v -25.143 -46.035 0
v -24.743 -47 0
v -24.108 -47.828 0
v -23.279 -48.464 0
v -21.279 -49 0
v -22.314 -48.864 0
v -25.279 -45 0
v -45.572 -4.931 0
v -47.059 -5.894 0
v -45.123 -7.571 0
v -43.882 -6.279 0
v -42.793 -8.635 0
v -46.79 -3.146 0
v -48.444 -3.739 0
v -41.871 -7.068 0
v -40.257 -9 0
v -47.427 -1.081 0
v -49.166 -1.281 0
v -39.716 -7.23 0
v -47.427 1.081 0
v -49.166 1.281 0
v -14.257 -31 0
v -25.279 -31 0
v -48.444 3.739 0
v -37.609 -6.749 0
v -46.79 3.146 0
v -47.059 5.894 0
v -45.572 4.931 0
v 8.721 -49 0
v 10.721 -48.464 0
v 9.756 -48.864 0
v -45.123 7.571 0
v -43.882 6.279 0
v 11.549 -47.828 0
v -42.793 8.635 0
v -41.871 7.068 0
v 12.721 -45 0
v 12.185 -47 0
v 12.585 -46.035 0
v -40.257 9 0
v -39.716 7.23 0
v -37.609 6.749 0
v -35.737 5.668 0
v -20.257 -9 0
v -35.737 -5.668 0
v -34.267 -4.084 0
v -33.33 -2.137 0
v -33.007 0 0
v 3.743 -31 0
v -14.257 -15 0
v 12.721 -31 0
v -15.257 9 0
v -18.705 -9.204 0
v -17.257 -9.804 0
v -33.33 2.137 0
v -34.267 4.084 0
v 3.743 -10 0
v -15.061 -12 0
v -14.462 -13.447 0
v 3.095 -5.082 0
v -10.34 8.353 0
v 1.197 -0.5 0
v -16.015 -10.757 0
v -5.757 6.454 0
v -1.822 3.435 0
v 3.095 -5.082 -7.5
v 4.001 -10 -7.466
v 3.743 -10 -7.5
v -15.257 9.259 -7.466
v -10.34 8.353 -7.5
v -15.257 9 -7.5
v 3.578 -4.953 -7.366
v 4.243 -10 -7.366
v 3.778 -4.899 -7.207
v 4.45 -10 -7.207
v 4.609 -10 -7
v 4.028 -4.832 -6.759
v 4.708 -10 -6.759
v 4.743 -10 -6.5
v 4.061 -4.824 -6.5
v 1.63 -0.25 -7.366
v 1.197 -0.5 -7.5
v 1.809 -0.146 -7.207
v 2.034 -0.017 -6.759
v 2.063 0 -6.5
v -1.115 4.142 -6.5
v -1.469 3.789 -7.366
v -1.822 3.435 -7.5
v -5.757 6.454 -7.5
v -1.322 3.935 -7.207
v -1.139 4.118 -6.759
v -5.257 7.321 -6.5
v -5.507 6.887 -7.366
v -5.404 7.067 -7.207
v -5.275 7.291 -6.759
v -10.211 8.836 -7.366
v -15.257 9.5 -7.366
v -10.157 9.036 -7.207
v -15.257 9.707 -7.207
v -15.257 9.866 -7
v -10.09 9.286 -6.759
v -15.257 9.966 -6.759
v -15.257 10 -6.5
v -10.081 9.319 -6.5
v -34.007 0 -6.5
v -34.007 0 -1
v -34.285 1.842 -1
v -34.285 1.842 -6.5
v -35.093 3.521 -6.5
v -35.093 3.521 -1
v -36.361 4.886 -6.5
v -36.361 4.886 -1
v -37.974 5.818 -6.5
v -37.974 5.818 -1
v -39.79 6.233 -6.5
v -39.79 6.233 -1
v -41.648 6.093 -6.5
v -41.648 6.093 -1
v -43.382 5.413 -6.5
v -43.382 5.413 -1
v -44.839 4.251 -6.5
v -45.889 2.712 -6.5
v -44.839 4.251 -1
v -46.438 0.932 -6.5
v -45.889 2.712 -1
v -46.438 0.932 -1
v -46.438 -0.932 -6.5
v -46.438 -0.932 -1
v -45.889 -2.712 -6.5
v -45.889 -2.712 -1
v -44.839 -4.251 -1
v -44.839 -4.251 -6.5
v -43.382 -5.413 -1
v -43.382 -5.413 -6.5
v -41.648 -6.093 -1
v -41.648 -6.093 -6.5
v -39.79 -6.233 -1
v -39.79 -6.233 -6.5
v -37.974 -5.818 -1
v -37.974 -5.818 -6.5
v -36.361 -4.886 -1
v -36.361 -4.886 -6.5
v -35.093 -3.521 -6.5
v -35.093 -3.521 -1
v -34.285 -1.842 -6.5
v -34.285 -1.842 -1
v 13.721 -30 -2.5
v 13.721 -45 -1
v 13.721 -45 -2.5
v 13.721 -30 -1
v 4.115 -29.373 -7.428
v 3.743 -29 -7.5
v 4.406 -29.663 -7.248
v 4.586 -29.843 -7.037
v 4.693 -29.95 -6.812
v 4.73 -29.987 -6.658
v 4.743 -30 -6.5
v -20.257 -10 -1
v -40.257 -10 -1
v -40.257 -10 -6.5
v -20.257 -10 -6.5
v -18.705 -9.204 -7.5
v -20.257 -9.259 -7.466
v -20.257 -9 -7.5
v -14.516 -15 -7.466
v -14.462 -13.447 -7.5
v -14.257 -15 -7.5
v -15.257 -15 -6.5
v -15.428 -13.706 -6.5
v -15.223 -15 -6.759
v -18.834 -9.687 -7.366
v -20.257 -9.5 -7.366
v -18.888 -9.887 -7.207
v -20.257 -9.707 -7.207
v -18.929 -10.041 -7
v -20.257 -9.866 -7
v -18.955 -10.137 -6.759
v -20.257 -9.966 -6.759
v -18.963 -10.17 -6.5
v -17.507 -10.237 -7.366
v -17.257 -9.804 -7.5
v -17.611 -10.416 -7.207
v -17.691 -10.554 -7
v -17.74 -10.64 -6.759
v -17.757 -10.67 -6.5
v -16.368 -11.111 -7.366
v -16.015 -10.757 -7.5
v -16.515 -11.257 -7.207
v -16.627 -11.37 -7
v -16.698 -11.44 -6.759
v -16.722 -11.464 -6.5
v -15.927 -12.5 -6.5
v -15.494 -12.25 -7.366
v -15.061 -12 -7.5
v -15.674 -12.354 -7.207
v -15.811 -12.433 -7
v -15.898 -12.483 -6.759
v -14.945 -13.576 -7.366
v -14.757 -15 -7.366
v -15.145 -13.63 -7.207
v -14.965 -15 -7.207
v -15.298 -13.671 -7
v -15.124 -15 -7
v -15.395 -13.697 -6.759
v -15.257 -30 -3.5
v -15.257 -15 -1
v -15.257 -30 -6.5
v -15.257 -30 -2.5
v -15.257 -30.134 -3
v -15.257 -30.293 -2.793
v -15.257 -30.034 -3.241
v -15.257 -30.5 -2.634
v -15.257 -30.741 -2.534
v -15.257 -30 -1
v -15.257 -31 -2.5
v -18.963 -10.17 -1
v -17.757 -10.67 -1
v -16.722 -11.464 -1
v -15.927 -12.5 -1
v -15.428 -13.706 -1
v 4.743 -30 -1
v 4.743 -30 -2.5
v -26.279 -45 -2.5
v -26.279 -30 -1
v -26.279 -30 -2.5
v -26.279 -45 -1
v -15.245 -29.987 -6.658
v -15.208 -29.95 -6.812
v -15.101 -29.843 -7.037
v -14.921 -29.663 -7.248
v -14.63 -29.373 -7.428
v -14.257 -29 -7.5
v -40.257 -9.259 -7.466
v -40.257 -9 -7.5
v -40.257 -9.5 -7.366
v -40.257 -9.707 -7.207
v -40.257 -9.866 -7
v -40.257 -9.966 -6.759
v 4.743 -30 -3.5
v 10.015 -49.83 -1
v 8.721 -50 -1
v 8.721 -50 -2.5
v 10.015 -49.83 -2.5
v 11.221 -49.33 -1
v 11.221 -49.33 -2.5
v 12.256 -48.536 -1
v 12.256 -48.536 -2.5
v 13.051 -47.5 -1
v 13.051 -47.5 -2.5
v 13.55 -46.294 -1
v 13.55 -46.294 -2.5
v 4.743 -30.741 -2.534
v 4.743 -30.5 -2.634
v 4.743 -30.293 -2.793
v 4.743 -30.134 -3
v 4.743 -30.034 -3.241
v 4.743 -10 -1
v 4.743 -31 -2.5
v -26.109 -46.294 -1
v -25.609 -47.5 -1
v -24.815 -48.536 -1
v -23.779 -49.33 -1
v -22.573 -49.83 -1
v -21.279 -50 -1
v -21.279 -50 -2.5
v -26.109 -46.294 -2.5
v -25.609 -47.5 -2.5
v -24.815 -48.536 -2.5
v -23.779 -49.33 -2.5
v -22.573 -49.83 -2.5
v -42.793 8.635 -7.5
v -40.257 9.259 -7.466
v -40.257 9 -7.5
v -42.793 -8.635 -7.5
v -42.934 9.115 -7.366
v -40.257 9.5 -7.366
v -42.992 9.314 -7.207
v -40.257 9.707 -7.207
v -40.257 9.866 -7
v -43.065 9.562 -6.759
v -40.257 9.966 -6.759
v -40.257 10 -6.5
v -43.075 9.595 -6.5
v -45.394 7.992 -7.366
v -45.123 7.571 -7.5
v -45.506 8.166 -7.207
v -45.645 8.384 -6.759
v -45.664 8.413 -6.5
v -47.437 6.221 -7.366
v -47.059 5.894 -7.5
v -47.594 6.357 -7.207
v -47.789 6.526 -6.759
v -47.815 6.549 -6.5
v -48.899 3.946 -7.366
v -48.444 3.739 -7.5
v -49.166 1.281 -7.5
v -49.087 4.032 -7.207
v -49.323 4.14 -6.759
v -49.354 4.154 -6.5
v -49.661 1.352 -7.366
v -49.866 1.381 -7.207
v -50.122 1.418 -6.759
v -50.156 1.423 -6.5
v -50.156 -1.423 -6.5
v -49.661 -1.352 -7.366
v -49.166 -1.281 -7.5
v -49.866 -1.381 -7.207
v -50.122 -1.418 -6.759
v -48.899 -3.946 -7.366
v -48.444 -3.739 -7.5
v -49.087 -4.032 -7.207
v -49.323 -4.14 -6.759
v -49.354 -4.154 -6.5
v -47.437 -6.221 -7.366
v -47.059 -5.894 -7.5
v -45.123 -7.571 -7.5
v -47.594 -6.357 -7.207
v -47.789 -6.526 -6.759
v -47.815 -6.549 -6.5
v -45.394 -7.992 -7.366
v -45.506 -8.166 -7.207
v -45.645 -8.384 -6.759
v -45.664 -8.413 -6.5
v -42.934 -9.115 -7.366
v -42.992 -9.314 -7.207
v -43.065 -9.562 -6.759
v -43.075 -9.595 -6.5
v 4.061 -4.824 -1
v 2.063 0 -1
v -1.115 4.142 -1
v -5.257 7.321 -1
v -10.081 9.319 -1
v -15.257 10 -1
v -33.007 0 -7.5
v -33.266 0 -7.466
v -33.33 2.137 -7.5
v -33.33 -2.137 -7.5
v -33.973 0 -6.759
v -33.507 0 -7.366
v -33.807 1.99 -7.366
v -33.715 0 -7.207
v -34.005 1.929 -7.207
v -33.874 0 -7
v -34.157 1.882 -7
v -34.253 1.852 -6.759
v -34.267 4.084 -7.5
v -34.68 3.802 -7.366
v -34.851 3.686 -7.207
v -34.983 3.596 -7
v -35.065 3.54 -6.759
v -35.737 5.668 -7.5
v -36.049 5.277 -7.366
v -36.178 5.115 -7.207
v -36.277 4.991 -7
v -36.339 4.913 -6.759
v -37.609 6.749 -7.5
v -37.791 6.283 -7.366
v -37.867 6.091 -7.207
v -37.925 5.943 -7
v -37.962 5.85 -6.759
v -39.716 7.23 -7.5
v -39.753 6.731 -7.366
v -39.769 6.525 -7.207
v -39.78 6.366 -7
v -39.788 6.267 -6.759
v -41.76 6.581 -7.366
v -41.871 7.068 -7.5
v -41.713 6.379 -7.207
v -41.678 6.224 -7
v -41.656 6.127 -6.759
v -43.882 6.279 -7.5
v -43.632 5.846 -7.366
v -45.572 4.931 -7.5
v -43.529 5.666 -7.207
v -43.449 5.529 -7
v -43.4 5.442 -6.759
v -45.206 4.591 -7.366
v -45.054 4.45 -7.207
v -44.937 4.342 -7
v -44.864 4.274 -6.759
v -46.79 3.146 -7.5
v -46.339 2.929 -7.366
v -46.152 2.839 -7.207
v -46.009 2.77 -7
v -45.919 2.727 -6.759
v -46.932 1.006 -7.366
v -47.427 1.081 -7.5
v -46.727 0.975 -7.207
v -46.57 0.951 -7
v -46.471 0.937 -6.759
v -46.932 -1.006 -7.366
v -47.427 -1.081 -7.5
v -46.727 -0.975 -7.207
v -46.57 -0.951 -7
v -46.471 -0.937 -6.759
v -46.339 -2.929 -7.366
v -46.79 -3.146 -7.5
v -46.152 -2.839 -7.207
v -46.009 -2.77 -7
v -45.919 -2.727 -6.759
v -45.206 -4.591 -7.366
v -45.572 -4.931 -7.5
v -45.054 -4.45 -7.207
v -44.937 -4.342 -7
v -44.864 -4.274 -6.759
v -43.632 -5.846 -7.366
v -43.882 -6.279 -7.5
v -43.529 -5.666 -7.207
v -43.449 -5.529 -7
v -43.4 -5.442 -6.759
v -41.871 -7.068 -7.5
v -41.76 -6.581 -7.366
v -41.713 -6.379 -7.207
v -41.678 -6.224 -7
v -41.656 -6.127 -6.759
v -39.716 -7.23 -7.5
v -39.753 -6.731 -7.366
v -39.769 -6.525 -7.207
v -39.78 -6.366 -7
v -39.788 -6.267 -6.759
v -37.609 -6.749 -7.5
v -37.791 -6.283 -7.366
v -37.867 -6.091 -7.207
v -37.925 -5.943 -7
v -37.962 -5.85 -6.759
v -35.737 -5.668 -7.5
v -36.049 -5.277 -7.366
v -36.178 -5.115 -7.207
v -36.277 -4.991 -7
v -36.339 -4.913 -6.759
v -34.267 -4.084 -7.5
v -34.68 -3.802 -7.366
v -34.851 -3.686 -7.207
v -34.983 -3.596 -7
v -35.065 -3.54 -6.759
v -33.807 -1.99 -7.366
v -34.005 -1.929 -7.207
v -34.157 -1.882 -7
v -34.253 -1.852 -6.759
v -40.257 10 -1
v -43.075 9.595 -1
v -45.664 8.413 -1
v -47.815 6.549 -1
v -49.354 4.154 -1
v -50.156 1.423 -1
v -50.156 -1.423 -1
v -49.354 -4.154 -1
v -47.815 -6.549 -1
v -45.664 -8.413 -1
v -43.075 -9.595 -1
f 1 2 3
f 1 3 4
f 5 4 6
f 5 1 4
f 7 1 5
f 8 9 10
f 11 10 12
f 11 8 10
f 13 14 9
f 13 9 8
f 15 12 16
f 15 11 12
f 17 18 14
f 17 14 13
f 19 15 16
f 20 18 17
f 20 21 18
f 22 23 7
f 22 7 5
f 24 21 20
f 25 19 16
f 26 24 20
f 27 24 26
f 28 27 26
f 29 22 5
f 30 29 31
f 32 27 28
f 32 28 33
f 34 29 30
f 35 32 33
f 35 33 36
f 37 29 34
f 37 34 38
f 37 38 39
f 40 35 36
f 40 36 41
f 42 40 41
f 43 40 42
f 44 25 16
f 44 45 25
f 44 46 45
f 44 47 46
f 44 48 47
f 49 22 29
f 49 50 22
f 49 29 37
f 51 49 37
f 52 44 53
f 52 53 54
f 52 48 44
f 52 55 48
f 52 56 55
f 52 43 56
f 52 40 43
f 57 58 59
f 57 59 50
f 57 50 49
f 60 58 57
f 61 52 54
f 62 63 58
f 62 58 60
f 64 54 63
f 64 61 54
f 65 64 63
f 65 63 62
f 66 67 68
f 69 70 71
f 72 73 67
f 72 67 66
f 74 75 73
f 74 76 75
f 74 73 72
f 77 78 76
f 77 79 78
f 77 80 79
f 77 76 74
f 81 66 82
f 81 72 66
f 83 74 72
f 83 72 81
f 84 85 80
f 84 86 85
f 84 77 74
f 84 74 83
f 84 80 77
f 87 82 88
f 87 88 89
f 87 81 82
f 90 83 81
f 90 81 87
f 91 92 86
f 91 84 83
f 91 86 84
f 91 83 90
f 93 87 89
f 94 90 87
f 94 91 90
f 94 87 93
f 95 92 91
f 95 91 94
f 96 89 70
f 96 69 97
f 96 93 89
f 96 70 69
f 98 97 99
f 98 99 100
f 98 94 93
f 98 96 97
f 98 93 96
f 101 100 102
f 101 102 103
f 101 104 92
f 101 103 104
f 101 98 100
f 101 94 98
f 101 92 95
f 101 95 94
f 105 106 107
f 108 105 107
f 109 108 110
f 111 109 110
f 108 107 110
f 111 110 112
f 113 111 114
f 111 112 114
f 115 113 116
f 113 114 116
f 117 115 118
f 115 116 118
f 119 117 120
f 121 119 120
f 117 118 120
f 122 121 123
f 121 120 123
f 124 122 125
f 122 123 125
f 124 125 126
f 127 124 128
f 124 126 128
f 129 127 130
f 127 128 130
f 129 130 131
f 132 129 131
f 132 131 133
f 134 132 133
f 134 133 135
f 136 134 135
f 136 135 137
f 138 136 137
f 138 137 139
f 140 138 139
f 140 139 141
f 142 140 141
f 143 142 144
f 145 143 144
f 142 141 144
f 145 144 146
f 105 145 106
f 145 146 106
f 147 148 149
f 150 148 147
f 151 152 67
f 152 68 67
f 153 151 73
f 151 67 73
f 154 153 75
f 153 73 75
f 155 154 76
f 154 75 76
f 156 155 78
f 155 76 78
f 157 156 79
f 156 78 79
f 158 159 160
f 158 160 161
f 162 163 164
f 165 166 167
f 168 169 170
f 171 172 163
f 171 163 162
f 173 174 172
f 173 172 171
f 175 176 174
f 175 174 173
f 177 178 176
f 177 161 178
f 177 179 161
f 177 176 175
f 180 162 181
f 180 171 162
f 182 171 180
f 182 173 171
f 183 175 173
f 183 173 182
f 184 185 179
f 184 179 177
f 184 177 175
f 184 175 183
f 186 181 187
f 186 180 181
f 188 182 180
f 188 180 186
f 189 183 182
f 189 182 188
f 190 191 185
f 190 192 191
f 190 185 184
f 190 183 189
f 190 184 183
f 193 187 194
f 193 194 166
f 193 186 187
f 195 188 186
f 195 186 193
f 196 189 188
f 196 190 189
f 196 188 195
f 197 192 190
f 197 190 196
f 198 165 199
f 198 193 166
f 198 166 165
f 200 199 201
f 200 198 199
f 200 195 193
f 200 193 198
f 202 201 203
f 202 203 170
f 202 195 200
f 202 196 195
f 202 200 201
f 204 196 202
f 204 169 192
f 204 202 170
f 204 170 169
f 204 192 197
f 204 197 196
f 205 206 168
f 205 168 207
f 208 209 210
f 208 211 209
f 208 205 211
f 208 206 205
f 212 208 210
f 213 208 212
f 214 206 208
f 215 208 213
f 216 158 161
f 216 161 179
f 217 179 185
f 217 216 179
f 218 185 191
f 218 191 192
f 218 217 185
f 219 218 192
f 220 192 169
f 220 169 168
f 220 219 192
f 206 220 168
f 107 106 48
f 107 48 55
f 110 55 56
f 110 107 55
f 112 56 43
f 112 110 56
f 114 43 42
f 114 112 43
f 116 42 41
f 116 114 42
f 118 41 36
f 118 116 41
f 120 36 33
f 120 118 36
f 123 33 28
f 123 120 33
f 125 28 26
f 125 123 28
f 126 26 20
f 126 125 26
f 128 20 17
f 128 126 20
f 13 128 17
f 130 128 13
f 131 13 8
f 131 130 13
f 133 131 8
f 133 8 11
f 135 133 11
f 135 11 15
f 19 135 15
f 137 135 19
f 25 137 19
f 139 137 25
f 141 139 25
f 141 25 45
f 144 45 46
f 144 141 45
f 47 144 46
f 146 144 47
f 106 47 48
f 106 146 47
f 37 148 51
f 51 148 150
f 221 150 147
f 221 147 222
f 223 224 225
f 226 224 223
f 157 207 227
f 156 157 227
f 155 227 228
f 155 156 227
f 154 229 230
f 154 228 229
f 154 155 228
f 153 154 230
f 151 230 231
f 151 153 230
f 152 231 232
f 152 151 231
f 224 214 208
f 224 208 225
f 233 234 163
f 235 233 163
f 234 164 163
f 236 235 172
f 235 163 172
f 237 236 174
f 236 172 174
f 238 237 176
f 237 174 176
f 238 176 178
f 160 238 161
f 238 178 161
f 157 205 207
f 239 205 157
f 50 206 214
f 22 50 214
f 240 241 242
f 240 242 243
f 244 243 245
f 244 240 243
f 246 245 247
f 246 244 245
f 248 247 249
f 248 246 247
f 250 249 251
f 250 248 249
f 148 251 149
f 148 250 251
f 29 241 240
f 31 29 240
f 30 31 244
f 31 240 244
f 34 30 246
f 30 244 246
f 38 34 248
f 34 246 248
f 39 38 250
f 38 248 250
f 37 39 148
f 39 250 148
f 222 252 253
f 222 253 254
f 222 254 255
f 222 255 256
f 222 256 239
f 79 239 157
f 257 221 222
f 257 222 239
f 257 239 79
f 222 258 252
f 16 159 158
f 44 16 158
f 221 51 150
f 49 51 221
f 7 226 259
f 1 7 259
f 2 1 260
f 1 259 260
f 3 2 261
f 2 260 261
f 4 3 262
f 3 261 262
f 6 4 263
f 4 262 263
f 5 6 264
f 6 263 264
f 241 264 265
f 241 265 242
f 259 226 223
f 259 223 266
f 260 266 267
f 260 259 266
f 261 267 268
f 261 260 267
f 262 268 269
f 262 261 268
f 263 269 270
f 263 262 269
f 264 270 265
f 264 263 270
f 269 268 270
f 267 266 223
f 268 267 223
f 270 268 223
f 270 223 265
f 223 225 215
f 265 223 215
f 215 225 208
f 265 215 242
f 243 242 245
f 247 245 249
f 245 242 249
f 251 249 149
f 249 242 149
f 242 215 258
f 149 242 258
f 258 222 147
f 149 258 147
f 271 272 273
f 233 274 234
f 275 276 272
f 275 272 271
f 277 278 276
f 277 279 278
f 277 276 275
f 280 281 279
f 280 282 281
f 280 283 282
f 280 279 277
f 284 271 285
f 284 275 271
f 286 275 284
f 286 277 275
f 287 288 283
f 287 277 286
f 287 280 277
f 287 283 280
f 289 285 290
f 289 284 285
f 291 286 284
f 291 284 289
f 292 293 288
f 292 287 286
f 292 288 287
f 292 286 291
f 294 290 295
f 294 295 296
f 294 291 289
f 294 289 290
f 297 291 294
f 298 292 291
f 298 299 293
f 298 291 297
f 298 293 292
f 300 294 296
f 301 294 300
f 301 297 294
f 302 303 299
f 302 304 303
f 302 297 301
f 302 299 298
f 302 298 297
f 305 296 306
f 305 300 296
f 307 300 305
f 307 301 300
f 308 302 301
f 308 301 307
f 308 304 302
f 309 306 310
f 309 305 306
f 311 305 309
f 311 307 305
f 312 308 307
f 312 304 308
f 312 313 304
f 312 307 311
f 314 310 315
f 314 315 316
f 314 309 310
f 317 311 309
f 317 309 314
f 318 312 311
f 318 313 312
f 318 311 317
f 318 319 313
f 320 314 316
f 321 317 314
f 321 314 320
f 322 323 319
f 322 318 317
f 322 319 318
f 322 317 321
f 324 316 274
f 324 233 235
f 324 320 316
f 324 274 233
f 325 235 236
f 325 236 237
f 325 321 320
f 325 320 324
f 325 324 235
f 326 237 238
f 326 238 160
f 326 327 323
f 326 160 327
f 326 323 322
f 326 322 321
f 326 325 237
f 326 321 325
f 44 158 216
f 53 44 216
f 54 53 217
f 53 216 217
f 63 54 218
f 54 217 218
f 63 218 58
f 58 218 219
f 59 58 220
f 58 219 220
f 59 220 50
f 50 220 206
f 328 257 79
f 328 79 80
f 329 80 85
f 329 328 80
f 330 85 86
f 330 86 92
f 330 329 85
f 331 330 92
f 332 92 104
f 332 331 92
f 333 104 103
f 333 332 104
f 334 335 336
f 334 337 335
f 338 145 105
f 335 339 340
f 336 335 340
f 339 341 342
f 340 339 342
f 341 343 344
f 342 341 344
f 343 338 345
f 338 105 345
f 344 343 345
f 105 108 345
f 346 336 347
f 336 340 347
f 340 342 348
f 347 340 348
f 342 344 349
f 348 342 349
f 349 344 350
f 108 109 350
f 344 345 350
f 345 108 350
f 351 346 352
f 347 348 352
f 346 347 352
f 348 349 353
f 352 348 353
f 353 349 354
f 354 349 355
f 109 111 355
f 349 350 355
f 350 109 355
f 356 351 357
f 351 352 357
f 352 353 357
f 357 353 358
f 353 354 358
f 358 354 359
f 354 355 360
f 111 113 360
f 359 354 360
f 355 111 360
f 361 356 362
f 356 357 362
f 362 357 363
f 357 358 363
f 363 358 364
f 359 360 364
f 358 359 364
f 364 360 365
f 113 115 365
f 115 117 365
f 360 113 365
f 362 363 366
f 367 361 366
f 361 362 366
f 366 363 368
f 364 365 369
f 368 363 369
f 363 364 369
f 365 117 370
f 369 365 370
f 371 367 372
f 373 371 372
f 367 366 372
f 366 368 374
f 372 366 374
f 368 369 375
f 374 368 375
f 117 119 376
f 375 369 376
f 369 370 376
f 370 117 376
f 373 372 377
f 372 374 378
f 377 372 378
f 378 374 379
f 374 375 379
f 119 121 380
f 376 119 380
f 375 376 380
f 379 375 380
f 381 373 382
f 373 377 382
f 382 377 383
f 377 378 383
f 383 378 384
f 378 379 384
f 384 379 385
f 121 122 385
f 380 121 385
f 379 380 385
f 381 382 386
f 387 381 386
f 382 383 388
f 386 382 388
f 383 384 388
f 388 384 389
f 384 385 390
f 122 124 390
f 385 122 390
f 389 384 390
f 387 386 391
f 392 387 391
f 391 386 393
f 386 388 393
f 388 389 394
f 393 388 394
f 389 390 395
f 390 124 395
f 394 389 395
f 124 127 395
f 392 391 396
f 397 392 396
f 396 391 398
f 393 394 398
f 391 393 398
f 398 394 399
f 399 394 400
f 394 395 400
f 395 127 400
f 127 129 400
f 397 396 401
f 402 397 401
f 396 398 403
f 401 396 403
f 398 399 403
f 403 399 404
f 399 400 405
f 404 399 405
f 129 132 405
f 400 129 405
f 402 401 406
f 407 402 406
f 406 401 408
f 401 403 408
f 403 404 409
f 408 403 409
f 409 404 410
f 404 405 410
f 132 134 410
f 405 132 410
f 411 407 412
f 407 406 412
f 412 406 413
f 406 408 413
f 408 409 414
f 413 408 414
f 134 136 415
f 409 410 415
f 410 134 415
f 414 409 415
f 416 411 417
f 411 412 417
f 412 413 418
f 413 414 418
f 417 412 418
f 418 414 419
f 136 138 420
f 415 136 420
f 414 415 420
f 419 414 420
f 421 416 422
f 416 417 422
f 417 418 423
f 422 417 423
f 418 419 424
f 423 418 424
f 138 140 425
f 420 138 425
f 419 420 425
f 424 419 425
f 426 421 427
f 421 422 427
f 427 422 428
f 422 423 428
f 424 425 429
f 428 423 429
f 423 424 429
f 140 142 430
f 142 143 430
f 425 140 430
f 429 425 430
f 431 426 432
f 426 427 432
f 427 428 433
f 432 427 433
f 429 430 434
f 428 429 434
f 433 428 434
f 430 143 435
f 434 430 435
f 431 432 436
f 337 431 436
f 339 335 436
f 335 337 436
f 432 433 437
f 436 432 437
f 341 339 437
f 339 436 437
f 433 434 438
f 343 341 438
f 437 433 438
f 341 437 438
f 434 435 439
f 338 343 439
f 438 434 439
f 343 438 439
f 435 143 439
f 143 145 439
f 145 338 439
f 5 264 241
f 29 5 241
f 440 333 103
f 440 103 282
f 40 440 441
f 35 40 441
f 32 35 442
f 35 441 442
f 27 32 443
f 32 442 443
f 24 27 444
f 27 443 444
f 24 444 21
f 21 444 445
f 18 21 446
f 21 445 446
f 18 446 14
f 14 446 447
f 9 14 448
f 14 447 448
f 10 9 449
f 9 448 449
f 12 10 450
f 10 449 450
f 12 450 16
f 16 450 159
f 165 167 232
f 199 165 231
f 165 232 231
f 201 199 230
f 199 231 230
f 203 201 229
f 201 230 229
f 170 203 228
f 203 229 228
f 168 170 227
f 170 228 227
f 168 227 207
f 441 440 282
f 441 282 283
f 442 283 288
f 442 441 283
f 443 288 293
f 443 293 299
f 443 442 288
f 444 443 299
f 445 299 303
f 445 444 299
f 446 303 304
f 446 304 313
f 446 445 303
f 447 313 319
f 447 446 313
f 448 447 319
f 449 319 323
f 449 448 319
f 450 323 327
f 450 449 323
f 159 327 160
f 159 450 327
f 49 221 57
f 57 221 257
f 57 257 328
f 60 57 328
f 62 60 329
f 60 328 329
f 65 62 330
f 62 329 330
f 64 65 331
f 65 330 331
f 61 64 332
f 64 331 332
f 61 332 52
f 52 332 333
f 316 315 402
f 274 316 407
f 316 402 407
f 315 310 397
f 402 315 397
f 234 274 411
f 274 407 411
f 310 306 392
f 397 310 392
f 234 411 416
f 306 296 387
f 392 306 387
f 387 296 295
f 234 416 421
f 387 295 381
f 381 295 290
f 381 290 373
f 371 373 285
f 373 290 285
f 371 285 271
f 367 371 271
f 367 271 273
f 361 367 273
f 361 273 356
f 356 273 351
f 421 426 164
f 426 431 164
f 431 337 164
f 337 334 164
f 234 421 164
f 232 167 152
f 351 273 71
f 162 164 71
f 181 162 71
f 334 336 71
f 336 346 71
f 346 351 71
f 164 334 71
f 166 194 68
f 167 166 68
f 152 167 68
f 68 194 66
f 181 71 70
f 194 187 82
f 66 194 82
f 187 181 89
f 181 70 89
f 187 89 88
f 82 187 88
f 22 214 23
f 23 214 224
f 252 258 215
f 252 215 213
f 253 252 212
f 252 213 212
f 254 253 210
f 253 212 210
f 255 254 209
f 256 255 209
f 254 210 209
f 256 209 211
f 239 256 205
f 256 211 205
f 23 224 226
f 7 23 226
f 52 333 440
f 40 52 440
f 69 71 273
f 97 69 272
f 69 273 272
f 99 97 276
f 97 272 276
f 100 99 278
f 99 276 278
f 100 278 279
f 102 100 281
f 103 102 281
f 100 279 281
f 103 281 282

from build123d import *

# Parameters (mm, degrees)
F0_R     = 6.25
F1_DEPTH = 7.5
F2_DEPTH = 2.5
F3_R     = 1
F4_SIZE  = 1


with BuildPart() as f1:
    # F0 (on Top) → F1 (new body)
    with BuildSketch(Plane.XY):
        with BuildLine():
            Line((-15.2574911714, 10), (-40.2574911714, 10))
            ThreePointArc((-40.2574911714, 10), (-50.2574911714, 0), (-40.2574911714, -10))
            Line((-40.2574911714, -10), (-20.2574911714, -10))
            ThreePointArc((-20.2574911714, -10), (-16.7219572654, -11.4644660941), (-15.2574911714, -15))
            Line((-15.2574911714, -15), (-15.2574911714, -30.0000000031))
            Line((-15.2574911714, -30.0000000031), (4.7425088286, -30.0000000031))
            Line((4.7425088286, -30.0000000031), (4.7425088286, -10))
            ThreePointArc((4.7425088286, -10), (-1.1153555476, 4.1421356237), (-15.2574911714, 10))
        make_face()
        with Locations((-40.2574911714, 0)):
            Circle(F0_R, mode=Mode.SUBTRACT)
    extrude(amount=-F1_DEPTH)

    # F0 (on Top) → F2 (join)
    with BuildSketch(Plane.XY):
        with BuildLine():
            Line((13.7208224833, -30.0000000031), (4.7425088286, -30.0000000031))
            Line((4.7425088286, -30.0000000031), (-15.2574911714, -30.0000000031))
            Line((-15.2574911714, -30.0000000031), (-26.2791775167, -30.0000000031))
            Line((-26.2791775167, -30.0000000031), (-26.2791775167, -45.0000000031))
            ThreePointArc((-26.2791775167, -45.0000000031), (-24.8147114226, -48.535533909), (-21.2791775167, -50.0000000031))
            Line((-21.2791775167, -50.0000000031), (8.7208224833, -50.0000000031))
            ThreePointArc((8.7208224833, -50.0000000031), (12.2563563892, -48.535533909), (13.7208224833, -45.0000000031))
            Line((13.7208224833, -45.0000000031), (13.7208224833, -30.0000000031))
        make_face()
    extrude(amount=-F2_DEPTH)

    # F3
    f3_edges = [f1.edges().sort_by_distance(p)[0] for p in [
        (-46.507491, 0, -7.5),
        (-27.757491, 10, -7.5),
        (-50.257491, 0, -7.5),
        (-30.257491, -10, -7.5),
        (-16.721957, -11.464466, -7.5),
        (-15.257491, -22.5, -7.5),
        (-5.257491, -30, -7.5),
        (4.742509, -20, -7.5),
        (-1.115356, 4.142136, -7.5),
        (-5.257491, -30, -2.5),
    ]]
    fillet(f3_edges, radius=F3_R)

    # F4
    f4_edges = [f1.edges().sort_by_distance(p)[0] for p in [
        (-27.757491, 10, 0),
        (-50.257491, 0, 0),
        (-30.257491, -10, 0),
        (-16.721957, -11.464466, 0),
        (-15.257491, -22.5, 0),
        (-20.768334, -30, 0),
        (-26.279178, -37.5, 0),
        (-24.814711, -48.535534, 0),
        (-6.279178, -50, 0),
        (12.256356, -48.535534, 0),
        (13.720822, -37.5, 0),
        (9.231666, -30, 0),
        (4.742509, -20, 0),
        (-1.115356, 4.142136, 0),
        (-46.507491, 0, 0),
    ]]
    chamfer(f4_edges, length=F4_SIZE)


solid = f1.part
